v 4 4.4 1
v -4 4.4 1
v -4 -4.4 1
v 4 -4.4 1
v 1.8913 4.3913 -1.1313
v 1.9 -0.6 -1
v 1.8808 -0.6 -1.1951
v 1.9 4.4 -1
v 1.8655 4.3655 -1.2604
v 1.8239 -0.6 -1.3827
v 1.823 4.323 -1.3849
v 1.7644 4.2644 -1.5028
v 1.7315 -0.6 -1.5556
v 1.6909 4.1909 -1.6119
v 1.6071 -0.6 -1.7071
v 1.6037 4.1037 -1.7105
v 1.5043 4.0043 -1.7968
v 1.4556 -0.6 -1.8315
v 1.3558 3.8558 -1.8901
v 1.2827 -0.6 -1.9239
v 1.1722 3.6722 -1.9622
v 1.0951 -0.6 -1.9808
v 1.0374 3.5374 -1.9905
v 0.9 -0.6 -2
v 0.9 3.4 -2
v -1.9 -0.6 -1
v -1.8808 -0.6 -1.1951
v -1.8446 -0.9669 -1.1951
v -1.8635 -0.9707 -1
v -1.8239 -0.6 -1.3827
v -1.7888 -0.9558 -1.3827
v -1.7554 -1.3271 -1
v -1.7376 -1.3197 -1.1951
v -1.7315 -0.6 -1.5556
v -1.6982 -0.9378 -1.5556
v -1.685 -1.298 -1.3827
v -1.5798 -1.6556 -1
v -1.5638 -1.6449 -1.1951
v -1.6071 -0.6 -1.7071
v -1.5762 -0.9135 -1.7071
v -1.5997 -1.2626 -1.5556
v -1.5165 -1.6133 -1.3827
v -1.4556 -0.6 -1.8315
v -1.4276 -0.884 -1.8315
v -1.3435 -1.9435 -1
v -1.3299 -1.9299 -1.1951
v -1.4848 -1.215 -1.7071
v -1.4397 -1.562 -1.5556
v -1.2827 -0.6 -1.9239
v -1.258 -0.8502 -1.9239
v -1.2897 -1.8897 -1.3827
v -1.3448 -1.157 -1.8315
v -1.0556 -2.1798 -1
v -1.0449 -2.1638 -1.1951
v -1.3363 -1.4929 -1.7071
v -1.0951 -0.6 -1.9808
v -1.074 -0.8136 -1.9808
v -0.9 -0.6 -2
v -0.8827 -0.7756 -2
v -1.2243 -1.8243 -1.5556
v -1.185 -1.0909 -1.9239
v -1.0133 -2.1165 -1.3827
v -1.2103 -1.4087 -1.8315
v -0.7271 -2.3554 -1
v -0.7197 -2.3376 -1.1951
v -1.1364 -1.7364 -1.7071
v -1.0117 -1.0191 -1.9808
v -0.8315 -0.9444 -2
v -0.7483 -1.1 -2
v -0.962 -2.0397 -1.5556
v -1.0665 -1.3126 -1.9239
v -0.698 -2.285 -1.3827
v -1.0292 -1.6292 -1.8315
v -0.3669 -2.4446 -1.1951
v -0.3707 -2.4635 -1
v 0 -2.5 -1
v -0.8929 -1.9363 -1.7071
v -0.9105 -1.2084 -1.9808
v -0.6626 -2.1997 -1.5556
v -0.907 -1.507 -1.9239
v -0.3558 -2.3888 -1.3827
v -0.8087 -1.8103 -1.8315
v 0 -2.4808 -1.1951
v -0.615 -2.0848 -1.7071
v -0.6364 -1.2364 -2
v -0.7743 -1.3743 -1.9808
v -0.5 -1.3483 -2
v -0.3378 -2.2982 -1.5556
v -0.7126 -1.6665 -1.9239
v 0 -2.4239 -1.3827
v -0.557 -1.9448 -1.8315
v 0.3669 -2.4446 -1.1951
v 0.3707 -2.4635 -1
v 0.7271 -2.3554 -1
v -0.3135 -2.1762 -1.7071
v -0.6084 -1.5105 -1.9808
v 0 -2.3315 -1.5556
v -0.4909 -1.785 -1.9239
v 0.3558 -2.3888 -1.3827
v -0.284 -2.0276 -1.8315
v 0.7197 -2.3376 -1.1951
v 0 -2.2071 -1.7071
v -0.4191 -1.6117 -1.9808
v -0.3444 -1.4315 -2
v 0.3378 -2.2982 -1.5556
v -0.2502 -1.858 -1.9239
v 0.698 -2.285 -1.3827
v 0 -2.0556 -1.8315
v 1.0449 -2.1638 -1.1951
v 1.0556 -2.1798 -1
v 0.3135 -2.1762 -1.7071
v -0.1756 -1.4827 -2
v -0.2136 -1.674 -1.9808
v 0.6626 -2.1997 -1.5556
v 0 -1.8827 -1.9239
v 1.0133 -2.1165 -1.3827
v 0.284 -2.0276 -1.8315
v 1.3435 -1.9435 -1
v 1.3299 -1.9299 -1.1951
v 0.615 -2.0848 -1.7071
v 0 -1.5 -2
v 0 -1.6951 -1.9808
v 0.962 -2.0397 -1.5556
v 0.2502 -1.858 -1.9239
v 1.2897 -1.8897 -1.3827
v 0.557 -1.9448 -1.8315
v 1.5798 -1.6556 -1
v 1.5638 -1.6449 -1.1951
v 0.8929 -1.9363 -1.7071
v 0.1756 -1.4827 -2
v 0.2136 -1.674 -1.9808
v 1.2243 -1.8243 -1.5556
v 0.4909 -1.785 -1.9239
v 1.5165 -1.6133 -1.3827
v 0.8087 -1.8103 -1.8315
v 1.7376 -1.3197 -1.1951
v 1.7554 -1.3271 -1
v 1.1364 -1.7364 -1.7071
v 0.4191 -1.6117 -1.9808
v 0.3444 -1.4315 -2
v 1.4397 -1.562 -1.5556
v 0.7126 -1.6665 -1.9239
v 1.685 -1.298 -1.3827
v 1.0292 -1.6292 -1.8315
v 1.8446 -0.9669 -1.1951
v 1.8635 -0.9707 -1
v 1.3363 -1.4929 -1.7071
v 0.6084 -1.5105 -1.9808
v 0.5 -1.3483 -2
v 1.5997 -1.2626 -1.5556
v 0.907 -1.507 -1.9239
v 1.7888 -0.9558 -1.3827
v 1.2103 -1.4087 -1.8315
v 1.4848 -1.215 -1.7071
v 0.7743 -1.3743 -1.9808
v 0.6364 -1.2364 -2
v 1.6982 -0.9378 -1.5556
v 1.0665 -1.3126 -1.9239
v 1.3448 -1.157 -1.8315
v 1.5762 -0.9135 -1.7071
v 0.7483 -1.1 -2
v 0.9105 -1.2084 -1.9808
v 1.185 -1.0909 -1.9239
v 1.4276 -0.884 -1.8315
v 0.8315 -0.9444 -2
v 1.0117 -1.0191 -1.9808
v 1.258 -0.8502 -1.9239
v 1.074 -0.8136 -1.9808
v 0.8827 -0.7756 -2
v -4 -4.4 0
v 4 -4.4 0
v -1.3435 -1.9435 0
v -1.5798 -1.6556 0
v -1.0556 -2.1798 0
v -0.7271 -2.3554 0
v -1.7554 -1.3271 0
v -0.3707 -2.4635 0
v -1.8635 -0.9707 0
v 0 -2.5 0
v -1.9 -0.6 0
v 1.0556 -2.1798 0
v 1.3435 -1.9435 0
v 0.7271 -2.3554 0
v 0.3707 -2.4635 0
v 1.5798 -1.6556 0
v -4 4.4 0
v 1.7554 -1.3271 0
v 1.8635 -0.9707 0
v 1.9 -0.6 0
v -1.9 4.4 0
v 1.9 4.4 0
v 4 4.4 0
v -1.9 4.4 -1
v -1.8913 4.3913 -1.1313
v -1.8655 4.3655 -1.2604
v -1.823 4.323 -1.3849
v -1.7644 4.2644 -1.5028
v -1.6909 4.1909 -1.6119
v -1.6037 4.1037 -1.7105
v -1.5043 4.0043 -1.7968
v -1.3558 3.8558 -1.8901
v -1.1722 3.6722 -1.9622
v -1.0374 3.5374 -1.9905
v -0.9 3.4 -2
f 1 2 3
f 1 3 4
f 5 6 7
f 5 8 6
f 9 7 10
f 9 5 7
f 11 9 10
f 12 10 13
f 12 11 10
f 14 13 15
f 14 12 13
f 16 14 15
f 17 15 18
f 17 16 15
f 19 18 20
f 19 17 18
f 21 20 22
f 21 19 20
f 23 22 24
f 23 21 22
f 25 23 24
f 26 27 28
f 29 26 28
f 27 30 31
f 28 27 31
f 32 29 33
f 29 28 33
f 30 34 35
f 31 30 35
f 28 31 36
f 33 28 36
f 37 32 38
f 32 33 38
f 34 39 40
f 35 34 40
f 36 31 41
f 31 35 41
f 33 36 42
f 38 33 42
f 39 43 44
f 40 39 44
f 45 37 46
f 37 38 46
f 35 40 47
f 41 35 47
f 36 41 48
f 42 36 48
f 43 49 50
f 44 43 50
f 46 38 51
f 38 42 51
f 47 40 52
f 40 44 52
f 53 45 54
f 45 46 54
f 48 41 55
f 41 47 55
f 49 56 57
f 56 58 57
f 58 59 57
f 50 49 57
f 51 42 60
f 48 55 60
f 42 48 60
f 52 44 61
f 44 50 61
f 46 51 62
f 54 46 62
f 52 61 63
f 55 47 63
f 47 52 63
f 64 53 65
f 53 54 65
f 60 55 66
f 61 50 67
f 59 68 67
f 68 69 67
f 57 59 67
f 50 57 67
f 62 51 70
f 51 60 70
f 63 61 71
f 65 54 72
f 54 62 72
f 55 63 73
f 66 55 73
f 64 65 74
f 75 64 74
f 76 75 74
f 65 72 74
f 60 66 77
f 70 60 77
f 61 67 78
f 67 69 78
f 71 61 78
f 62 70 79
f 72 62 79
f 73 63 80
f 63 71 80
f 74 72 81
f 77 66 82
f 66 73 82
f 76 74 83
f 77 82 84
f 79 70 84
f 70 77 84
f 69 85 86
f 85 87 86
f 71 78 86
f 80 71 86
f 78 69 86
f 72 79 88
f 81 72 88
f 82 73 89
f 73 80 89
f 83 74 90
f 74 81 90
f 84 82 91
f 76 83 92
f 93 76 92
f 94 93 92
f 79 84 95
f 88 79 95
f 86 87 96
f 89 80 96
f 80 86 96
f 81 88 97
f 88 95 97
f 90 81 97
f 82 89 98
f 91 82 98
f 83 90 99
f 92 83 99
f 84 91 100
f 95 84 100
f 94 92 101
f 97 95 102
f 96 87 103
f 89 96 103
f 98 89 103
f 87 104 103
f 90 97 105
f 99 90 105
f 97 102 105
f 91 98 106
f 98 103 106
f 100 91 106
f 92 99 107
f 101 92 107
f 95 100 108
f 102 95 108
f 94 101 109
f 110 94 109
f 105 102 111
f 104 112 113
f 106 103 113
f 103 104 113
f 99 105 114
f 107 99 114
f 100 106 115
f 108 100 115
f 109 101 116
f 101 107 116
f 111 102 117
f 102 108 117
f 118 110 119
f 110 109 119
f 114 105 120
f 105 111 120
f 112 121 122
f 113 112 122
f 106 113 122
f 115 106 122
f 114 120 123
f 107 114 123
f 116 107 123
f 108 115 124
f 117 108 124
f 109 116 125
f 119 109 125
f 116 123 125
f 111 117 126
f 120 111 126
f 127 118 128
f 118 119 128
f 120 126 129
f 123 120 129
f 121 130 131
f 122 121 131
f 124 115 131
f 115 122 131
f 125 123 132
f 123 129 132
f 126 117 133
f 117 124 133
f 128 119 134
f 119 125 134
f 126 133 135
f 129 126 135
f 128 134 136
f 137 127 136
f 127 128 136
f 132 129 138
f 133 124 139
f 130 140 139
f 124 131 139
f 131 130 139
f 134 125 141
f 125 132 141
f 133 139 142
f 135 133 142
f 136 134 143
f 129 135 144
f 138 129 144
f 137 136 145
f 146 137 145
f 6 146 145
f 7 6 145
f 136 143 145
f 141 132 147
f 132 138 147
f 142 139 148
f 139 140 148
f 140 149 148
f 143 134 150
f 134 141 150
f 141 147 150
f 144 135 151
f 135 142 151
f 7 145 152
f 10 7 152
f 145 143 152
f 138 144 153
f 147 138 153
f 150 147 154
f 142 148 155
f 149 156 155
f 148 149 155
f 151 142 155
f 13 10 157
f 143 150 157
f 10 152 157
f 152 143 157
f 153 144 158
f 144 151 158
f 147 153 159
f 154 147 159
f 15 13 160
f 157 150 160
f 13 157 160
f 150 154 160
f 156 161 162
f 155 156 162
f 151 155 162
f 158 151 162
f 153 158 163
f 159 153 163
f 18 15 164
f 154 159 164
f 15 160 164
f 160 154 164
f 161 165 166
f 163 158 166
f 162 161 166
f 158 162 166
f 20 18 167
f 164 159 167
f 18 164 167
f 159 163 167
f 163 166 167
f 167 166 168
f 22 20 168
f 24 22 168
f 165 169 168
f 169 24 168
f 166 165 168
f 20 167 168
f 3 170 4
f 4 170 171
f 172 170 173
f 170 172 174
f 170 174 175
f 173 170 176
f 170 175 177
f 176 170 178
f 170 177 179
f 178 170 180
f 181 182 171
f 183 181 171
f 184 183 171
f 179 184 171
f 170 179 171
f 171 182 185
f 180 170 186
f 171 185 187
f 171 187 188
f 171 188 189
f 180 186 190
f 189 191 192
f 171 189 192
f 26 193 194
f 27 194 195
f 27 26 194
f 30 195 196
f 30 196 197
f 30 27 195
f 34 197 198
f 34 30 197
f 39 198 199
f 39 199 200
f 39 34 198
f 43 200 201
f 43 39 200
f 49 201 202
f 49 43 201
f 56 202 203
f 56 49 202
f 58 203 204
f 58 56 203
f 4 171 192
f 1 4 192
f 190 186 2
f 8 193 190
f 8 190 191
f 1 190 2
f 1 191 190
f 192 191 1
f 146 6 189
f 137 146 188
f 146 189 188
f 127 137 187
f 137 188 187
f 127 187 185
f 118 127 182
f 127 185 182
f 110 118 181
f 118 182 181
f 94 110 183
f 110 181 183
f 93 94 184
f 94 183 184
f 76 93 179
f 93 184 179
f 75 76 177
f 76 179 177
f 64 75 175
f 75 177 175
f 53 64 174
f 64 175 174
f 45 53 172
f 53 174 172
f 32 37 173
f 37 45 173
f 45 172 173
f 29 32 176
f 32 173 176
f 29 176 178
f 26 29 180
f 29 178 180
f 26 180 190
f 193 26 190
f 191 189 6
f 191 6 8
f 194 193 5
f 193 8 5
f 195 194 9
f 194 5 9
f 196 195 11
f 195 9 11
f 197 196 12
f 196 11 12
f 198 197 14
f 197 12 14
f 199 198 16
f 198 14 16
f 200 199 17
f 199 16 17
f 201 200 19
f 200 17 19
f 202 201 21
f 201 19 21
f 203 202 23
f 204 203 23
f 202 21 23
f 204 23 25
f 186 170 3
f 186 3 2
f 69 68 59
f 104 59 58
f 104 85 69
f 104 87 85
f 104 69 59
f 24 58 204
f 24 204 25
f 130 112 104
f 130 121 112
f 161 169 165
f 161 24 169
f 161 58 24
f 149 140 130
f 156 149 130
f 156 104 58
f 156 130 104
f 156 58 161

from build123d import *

# Parameters (mm, degrees)
SKETCH033_W  = 8
SKETCH033_H  = 8.8
PAD011_DEPTH = 1
PAD012_DEPTH = 2
FILLET017_R  = 1


with BuildPart() as part:
    # Sketch033 → Pad011 (new body)
    with BuildSketch(Plane.XY):
        Rectangle(SKETCH033_W, SKETCH033_H)
    extrude(amount=PAD011_DEPTH)

    # Sketch034 (on Face5 of Pad011) → Pad012 (join)
    with BuildSketch(Plane(origin=(0, 0, 0), x_dir=(1, 0, 0), z_dir=(0, 0, -1))):
        with BuildLine():
            ThreePointArc((1.9, 0.6), (0, 2.5), (-1.9, 0.6))
            Line((-1.9, 0.6), (-1.9, -4.4))
            Line((-1.9, -4.4), (1.9, -4.4))
            Line((1.9, 0.6), (1.9, -4.4))
        make_face()
    extrude(amount=PAD012_DEPTH)

    # Fillet017
    fillet017_edges = [part.edges().sort_by_distance(p)[0] for p in [
        (1.9, 1.9, -2),
        (0, -2.5, -2),
        (-1.9, 1.9, -2),
        (0, 4.4, -2),
    ]]
    fillet(fillet017_edges, radius=FILLET017_R)


solid = part.part
